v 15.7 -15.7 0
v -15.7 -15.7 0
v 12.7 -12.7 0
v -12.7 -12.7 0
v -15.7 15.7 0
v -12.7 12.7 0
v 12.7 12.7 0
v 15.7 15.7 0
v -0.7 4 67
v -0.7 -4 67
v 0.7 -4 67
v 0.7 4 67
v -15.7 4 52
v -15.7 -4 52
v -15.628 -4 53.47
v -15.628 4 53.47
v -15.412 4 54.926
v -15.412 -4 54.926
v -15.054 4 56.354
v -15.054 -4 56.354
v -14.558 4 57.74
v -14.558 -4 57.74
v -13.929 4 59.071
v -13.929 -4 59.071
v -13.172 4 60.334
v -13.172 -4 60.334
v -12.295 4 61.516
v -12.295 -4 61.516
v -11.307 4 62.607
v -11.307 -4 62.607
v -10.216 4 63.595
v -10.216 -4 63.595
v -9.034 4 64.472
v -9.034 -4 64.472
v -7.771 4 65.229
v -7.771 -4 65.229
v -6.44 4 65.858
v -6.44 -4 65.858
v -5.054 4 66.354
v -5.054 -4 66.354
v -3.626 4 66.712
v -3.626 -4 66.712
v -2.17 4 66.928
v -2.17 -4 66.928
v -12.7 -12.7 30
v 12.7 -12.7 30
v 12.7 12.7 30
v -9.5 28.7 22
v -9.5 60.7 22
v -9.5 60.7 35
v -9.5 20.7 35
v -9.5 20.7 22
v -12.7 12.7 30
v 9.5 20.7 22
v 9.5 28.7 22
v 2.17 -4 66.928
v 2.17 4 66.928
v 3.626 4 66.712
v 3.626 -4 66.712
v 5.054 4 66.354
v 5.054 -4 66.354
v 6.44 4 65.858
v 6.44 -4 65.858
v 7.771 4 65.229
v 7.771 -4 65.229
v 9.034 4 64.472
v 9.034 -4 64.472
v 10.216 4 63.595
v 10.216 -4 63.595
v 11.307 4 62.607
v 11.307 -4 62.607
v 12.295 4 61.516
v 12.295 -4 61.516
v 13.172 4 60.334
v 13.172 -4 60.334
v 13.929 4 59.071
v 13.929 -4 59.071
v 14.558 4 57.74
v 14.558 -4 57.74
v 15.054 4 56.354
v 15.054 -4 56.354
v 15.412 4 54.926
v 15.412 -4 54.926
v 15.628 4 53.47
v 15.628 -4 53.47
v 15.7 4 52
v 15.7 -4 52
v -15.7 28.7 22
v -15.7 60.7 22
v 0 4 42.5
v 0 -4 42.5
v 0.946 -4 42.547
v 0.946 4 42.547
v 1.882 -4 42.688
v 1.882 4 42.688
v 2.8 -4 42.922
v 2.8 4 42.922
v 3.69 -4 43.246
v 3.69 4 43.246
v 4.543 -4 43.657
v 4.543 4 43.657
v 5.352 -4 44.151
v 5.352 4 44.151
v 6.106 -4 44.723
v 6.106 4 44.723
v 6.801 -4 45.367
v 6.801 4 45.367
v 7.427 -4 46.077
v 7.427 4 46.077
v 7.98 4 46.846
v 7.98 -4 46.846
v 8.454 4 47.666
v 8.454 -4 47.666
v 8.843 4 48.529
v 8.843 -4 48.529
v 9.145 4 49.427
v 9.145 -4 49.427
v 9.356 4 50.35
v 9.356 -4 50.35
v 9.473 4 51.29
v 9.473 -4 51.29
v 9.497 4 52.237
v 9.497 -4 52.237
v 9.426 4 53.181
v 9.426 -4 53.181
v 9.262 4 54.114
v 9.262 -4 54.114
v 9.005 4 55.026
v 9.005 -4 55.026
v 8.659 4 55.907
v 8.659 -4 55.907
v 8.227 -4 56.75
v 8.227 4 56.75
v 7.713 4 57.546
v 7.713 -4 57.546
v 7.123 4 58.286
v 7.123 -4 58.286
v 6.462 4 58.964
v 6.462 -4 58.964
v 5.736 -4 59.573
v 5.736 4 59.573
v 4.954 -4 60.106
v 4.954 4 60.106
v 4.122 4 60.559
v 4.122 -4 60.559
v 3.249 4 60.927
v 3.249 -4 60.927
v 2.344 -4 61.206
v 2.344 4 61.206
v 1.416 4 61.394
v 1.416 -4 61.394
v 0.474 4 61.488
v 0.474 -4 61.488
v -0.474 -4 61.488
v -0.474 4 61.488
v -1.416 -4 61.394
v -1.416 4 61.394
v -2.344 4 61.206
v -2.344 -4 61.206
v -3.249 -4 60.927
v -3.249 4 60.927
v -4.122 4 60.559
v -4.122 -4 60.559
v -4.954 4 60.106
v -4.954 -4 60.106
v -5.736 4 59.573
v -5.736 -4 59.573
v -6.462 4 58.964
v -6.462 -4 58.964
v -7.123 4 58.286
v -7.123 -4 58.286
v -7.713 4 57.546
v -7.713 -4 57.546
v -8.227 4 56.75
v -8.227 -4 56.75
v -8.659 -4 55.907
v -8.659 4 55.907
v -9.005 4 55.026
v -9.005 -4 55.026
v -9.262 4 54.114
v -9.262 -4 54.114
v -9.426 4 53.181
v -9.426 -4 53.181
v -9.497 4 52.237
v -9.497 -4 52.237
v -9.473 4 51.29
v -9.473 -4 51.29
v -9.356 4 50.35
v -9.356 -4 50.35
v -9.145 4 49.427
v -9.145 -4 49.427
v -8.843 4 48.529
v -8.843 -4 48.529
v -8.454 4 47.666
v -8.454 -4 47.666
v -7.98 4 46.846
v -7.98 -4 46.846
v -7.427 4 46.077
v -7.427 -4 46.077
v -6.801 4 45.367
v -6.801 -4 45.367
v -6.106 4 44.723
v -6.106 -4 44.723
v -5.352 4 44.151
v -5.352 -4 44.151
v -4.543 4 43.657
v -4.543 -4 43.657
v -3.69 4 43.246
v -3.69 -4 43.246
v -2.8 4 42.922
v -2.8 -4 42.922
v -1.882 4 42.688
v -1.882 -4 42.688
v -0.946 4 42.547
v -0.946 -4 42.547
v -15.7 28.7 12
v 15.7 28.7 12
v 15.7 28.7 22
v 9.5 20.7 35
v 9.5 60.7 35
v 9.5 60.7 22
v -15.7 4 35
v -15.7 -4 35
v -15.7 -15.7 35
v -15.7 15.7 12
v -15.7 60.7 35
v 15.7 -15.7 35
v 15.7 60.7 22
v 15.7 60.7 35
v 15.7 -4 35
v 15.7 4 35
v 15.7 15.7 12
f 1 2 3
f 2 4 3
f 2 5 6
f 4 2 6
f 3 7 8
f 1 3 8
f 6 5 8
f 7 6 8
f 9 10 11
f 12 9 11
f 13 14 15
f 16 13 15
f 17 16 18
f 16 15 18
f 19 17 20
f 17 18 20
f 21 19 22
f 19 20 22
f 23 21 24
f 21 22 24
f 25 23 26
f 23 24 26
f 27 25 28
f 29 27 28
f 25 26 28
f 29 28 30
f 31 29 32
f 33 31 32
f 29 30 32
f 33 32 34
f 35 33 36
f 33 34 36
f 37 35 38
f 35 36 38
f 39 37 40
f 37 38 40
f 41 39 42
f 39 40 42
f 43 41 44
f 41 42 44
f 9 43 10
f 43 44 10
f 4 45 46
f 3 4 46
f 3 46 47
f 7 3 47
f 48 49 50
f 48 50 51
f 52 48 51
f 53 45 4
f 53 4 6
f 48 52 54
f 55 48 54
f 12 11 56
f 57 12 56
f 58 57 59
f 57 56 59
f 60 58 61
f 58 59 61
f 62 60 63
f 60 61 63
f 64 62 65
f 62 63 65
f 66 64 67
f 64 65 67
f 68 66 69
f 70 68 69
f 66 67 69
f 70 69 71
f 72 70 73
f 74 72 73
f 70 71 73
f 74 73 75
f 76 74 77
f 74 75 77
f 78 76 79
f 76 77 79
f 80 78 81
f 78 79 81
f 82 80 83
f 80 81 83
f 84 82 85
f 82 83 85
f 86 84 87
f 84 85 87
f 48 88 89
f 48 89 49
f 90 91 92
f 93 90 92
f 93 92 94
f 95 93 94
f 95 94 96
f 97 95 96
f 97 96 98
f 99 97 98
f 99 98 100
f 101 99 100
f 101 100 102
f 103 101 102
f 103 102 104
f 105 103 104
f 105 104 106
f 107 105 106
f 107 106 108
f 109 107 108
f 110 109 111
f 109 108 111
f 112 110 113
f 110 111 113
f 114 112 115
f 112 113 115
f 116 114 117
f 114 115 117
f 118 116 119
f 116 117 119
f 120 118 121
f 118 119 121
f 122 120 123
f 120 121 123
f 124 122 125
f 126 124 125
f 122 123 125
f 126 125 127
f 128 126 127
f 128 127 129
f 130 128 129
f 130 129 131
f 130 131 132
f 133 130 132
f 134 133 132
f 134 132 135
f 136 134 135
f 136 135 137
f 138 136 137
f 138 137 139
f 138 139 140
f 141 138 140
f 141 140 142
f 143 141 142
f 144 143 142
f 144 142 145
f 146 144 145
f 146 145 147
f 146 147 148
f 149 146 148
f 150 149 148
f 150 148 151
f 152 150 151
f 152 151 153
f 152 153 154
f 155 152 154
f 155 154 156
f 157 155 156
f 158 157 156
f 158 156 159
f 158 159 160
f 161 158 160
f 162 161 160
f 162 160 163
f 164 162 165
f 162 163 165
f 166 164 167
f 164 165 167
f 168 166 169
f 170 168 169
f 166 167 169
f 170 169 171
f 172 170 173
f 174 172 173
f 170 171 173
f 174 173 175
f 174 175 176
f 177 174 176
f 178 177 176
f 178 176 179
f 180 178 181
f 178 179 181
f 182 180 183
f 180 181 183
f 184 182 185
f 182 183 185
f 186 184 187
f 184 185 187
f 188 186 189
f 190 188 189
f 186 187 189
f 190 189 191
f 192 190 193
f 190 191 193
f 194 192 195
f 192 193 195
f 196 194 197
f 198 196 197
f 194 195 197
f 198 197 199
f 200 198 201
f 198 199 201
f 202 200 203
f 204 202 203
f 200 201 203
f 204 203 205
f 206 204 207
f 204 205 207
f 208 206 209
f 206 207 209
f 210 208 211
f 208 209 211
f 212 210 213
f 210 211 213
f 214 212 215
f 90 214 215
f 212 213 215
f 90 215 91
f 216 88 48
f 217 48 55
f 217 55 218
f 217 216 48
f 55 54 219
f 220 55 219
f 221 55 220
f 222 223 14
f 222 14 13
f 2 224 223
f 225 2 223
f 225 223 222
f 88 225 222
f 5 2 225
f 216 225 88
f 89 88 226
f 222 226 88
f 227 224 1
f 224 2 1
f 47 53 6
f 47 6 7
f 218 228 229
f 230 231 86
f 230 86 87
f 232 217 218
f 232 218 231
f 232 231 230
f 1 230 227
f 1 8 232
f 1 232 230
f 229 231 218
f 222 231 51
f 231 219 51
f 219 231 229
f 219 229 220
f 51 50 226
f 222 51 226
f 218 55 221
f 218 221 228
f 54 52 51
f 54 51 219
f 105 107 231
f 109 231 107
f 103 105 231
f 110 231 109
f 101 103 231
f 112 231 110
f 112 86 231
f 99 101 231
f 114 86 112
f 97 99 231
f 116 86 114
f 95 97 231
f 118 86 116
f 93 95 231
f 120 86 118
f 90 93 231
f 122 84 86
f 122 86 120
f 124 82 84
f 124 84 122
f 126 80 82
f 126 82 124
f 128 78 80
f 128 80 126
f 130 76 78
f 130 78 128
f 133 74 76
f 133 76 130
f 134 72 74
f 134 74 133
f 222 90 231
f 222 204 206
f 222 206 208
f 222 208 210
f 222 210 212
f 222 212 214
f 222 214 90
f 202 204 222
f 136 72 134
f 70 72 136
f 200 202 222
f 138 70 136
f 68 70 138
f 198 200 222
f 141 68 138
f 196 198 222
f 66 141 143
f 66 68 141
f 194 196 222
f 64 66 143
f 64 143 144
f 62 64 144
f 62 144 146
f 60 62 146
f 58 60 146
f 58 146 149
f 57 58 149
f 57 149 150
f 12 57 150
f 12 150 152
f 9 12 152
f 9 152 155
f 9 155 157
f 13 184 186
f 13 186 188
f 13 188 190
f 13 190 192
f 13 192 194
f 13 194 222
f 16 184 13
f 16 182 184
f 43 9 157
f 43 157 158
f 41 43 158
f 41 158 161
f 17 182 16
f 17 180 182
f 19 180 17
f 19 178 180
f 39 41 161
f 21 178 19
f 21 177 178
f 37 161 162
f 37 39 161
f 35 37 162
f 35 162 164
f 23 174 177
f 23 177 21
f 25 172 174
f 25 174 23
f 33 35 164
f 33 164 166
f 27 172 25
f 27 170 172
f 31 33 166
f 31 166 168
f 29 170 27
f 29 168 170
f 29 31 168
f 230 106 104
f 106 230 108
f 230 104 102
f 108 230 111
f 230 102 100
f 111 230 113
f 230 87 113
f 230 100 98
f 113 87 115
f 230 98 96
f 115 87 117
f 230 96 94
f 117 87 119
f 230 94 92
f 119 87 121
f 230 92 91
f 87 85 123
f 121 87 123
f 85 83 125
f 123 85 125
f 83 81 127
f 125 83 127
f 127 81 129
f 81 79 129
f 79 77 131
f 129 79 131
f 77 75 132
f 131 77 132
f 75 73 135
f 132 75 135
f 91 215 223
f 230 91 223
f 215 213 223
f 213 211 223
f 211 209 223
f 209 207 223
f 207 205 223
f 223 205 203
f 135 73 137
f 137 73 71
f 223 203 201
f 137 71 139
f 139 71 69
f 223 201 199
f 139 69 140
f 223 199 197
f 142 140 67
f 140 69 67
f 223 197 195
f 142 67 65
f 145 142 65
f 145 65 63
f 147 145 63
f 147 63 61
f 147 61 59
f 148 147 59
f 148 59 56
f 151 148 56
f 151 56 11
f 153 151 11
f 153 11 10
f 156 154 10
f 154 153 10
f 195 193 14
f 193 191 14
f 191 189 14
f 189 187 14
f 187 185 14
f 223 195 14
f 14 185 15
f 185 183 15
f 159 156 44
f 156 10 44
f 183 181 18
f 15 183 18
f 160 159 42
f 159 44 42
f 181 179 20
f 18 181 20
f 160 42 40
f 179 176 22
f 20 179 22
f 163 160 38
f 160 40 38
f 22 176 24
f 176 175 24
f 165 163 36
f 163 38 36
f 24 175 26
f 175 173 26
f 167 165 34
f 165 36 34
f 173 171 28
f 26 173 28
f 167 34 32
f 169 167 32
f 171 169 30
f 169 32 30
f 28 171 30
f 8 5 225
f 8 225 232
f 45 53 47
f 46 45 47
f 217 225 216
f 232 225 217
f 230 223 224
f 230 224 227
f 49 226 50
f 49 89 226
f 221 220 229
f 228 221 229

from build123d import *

# Parameters (mm, degrees)
SKETCH4_W            = 31.4
SKETCH4_H            = 31.4
SKETCH4_W_2          = 25.4
SKETCH4_H_2          = 25.4
BOSS_EXTRUDE3_DEPTH  = 30
SKETCH5_W            = 31.4
SKETCH5_H            = 31.4
BOSS_EXTRUDE4_DEPTH  = 5
SKETCH6_W            = 31.4
SKETCH6_H            = 8
BOSS_EXTRUDE5_DEPTH  = 5
BOSS_EXTRUDE6_DEPTH  = 8
SKETCH8_R            = 9.5
BOSS_EXTRUDE7_DEPTH  = 8
SKETCH9_W            = 31.4
SKETCH9_H            = 10
BOSS_EXTRUDE8_DEPTH  = 5
SKETCH10_W           = 31.4
SKETCH10_H           = 10
BOSS_EXTRUDE9_DEPTH  = 13
SKETCH11_W           = 6.2
SKETCH11_H           = 10
BOSS_EXTRUDE10_DEPTH = 40
BOSS_EXTRUDE11_DEPTH = 3
CUT_EXTRUDE1_START   = 8
SKETCH8_2_R          = 9.5
CUT_EXTRUDE1_DEPTH   = 24


with BuildPart() as part:
    # Sketch4 → Boss-Extrude3 (new body)
    with BuildSketch(Plane.XY):
        Rectangle(SKETCH4_W, SKETCH4_H)
        Rectangle(SKETCH4_W_2, SKETCH4_H_2, mode=Mode.SUBTRACT)
    extrude(amount=BOSS_EXTRUDE3_DEPTH)

    # Sketch5 → Boss-Extrude4 (add)
    with BuildSketch(Plane.XY.offset(30)):
        Rectangle(SKETCH5_W, SKETCH5_H)
    extrude(amount=BOSS_EXTRUDE4_DEPTH)

    # Sketch6 → Boss-Extrude5 (add)
    with BuildSketch(Plane.XY.offset(35)):
        Rectangle(SKETCH6_W, SKETCH6_H)
    extrude(amount=BOSS_EXTRUDE5_DEPTH)

    # Sketch7 → Boss-Extrude6 (add)
    with BuildSketch(Plane.XZ.offset(4)):
        with BuildLine():
            Line((-15.7, 40), (-15.7, 52))
            ThreePointArc((-15.7, 52), (-11.306601718, 62.606601718), (-0.7, 67))
            Line((-0.7, 67), (0.7, 67))
            ThreePointArc((0.7, 67), (11.306601718, 62.606601718), (15.7, 52))
            Line((15.7, 52), (15.7, 40))
            Line((15.7, 40), (-15.7, 40))
        make_face()
    extrude(amount=-BOSS_EXTRUDE6_DEPTH)

    # Sketch8 → Boss-Extrude7 (add)
    with BuildSketch(Plane.XZ.offset(4)):
        with Locations((0, 52)):
            Circle(SKETCH8_R)
    boss_extrude7 = extrude(amount=BOSS_EXTRUDE7_DEPTH)

    # Mirror1: Boss-Extrude7 across plane
    add(boss_extrude7.mirror(Plane.ZX))

    # Sketch9 → Boss-Extrude8 (add)
    with BuildSketch(Plane(origin=(0, 15.7, 0), x_dir=(1, 0, 0), z_dir=(0, 1, 0))):
        with Locations((0, -27)):
            Rectangle(SKETCH9_W, SKETCH9_H)
    extrude(amount=BOSS_EXTRUDE8_DEPTH)

    # Sketch10 → Boss-Extrude9 (add)
    with BuildSketch(Plane(origin=(0, 15.7, 0), x_dir=(1, 0, 0), z_dir=(0, 1, 0))):
        with Locations((0, -17)):
            Rectangle(SKETCH10_W, SKETCH10_H)
    extrude(amount=BOSS_EXTRUDE9_DEPTH)

    # Sketch11 → Boss-Extrude10 (add)
    with BuildSketch(Plane(origin=(0, 20.7, 0), x_dir=(1, 0, 0), z_dir=(0, 1, 0))):
        with Locations((-12.6, -27)):
            Rectangle(SKETCH11_W, SKETCH11_H)
        with Locations((12.6, -27)):
            Rectangle(SKETCH11_W, SKETCH11_H)
    extrude(amount=BOSS_EXTRUDE10_DEPTH)

    # Sketch12 → Boss-Extrude11 (add)
    with BuildSketch(Plane.XY.offset(32)):
        Polygon((-15.7, 60.7), (-9.5, 60.7), (-9.5, 20.7), (9.5, 20.7), (9.5, 60.7), (15.7, 60.7), (15.7, 15.7), (-15.7, 15.7), align=None)
    extrude(amount=BOSS_EXTRUDE11_DEPTH)

    # Sketch8<2> → Cut-Extrude1 (cut)
    with BuildSketch(Plane.XZ.offset(4).offset(CUT_EXTRUDE1_START)):
        with Locations((0, 52)):
            Circle(SKETCH8_2_R)
    extrude(amount=-CUT_EXTRUDE1_DEPTH, mode=Mode.SUBTRACT)


solid = part.part
